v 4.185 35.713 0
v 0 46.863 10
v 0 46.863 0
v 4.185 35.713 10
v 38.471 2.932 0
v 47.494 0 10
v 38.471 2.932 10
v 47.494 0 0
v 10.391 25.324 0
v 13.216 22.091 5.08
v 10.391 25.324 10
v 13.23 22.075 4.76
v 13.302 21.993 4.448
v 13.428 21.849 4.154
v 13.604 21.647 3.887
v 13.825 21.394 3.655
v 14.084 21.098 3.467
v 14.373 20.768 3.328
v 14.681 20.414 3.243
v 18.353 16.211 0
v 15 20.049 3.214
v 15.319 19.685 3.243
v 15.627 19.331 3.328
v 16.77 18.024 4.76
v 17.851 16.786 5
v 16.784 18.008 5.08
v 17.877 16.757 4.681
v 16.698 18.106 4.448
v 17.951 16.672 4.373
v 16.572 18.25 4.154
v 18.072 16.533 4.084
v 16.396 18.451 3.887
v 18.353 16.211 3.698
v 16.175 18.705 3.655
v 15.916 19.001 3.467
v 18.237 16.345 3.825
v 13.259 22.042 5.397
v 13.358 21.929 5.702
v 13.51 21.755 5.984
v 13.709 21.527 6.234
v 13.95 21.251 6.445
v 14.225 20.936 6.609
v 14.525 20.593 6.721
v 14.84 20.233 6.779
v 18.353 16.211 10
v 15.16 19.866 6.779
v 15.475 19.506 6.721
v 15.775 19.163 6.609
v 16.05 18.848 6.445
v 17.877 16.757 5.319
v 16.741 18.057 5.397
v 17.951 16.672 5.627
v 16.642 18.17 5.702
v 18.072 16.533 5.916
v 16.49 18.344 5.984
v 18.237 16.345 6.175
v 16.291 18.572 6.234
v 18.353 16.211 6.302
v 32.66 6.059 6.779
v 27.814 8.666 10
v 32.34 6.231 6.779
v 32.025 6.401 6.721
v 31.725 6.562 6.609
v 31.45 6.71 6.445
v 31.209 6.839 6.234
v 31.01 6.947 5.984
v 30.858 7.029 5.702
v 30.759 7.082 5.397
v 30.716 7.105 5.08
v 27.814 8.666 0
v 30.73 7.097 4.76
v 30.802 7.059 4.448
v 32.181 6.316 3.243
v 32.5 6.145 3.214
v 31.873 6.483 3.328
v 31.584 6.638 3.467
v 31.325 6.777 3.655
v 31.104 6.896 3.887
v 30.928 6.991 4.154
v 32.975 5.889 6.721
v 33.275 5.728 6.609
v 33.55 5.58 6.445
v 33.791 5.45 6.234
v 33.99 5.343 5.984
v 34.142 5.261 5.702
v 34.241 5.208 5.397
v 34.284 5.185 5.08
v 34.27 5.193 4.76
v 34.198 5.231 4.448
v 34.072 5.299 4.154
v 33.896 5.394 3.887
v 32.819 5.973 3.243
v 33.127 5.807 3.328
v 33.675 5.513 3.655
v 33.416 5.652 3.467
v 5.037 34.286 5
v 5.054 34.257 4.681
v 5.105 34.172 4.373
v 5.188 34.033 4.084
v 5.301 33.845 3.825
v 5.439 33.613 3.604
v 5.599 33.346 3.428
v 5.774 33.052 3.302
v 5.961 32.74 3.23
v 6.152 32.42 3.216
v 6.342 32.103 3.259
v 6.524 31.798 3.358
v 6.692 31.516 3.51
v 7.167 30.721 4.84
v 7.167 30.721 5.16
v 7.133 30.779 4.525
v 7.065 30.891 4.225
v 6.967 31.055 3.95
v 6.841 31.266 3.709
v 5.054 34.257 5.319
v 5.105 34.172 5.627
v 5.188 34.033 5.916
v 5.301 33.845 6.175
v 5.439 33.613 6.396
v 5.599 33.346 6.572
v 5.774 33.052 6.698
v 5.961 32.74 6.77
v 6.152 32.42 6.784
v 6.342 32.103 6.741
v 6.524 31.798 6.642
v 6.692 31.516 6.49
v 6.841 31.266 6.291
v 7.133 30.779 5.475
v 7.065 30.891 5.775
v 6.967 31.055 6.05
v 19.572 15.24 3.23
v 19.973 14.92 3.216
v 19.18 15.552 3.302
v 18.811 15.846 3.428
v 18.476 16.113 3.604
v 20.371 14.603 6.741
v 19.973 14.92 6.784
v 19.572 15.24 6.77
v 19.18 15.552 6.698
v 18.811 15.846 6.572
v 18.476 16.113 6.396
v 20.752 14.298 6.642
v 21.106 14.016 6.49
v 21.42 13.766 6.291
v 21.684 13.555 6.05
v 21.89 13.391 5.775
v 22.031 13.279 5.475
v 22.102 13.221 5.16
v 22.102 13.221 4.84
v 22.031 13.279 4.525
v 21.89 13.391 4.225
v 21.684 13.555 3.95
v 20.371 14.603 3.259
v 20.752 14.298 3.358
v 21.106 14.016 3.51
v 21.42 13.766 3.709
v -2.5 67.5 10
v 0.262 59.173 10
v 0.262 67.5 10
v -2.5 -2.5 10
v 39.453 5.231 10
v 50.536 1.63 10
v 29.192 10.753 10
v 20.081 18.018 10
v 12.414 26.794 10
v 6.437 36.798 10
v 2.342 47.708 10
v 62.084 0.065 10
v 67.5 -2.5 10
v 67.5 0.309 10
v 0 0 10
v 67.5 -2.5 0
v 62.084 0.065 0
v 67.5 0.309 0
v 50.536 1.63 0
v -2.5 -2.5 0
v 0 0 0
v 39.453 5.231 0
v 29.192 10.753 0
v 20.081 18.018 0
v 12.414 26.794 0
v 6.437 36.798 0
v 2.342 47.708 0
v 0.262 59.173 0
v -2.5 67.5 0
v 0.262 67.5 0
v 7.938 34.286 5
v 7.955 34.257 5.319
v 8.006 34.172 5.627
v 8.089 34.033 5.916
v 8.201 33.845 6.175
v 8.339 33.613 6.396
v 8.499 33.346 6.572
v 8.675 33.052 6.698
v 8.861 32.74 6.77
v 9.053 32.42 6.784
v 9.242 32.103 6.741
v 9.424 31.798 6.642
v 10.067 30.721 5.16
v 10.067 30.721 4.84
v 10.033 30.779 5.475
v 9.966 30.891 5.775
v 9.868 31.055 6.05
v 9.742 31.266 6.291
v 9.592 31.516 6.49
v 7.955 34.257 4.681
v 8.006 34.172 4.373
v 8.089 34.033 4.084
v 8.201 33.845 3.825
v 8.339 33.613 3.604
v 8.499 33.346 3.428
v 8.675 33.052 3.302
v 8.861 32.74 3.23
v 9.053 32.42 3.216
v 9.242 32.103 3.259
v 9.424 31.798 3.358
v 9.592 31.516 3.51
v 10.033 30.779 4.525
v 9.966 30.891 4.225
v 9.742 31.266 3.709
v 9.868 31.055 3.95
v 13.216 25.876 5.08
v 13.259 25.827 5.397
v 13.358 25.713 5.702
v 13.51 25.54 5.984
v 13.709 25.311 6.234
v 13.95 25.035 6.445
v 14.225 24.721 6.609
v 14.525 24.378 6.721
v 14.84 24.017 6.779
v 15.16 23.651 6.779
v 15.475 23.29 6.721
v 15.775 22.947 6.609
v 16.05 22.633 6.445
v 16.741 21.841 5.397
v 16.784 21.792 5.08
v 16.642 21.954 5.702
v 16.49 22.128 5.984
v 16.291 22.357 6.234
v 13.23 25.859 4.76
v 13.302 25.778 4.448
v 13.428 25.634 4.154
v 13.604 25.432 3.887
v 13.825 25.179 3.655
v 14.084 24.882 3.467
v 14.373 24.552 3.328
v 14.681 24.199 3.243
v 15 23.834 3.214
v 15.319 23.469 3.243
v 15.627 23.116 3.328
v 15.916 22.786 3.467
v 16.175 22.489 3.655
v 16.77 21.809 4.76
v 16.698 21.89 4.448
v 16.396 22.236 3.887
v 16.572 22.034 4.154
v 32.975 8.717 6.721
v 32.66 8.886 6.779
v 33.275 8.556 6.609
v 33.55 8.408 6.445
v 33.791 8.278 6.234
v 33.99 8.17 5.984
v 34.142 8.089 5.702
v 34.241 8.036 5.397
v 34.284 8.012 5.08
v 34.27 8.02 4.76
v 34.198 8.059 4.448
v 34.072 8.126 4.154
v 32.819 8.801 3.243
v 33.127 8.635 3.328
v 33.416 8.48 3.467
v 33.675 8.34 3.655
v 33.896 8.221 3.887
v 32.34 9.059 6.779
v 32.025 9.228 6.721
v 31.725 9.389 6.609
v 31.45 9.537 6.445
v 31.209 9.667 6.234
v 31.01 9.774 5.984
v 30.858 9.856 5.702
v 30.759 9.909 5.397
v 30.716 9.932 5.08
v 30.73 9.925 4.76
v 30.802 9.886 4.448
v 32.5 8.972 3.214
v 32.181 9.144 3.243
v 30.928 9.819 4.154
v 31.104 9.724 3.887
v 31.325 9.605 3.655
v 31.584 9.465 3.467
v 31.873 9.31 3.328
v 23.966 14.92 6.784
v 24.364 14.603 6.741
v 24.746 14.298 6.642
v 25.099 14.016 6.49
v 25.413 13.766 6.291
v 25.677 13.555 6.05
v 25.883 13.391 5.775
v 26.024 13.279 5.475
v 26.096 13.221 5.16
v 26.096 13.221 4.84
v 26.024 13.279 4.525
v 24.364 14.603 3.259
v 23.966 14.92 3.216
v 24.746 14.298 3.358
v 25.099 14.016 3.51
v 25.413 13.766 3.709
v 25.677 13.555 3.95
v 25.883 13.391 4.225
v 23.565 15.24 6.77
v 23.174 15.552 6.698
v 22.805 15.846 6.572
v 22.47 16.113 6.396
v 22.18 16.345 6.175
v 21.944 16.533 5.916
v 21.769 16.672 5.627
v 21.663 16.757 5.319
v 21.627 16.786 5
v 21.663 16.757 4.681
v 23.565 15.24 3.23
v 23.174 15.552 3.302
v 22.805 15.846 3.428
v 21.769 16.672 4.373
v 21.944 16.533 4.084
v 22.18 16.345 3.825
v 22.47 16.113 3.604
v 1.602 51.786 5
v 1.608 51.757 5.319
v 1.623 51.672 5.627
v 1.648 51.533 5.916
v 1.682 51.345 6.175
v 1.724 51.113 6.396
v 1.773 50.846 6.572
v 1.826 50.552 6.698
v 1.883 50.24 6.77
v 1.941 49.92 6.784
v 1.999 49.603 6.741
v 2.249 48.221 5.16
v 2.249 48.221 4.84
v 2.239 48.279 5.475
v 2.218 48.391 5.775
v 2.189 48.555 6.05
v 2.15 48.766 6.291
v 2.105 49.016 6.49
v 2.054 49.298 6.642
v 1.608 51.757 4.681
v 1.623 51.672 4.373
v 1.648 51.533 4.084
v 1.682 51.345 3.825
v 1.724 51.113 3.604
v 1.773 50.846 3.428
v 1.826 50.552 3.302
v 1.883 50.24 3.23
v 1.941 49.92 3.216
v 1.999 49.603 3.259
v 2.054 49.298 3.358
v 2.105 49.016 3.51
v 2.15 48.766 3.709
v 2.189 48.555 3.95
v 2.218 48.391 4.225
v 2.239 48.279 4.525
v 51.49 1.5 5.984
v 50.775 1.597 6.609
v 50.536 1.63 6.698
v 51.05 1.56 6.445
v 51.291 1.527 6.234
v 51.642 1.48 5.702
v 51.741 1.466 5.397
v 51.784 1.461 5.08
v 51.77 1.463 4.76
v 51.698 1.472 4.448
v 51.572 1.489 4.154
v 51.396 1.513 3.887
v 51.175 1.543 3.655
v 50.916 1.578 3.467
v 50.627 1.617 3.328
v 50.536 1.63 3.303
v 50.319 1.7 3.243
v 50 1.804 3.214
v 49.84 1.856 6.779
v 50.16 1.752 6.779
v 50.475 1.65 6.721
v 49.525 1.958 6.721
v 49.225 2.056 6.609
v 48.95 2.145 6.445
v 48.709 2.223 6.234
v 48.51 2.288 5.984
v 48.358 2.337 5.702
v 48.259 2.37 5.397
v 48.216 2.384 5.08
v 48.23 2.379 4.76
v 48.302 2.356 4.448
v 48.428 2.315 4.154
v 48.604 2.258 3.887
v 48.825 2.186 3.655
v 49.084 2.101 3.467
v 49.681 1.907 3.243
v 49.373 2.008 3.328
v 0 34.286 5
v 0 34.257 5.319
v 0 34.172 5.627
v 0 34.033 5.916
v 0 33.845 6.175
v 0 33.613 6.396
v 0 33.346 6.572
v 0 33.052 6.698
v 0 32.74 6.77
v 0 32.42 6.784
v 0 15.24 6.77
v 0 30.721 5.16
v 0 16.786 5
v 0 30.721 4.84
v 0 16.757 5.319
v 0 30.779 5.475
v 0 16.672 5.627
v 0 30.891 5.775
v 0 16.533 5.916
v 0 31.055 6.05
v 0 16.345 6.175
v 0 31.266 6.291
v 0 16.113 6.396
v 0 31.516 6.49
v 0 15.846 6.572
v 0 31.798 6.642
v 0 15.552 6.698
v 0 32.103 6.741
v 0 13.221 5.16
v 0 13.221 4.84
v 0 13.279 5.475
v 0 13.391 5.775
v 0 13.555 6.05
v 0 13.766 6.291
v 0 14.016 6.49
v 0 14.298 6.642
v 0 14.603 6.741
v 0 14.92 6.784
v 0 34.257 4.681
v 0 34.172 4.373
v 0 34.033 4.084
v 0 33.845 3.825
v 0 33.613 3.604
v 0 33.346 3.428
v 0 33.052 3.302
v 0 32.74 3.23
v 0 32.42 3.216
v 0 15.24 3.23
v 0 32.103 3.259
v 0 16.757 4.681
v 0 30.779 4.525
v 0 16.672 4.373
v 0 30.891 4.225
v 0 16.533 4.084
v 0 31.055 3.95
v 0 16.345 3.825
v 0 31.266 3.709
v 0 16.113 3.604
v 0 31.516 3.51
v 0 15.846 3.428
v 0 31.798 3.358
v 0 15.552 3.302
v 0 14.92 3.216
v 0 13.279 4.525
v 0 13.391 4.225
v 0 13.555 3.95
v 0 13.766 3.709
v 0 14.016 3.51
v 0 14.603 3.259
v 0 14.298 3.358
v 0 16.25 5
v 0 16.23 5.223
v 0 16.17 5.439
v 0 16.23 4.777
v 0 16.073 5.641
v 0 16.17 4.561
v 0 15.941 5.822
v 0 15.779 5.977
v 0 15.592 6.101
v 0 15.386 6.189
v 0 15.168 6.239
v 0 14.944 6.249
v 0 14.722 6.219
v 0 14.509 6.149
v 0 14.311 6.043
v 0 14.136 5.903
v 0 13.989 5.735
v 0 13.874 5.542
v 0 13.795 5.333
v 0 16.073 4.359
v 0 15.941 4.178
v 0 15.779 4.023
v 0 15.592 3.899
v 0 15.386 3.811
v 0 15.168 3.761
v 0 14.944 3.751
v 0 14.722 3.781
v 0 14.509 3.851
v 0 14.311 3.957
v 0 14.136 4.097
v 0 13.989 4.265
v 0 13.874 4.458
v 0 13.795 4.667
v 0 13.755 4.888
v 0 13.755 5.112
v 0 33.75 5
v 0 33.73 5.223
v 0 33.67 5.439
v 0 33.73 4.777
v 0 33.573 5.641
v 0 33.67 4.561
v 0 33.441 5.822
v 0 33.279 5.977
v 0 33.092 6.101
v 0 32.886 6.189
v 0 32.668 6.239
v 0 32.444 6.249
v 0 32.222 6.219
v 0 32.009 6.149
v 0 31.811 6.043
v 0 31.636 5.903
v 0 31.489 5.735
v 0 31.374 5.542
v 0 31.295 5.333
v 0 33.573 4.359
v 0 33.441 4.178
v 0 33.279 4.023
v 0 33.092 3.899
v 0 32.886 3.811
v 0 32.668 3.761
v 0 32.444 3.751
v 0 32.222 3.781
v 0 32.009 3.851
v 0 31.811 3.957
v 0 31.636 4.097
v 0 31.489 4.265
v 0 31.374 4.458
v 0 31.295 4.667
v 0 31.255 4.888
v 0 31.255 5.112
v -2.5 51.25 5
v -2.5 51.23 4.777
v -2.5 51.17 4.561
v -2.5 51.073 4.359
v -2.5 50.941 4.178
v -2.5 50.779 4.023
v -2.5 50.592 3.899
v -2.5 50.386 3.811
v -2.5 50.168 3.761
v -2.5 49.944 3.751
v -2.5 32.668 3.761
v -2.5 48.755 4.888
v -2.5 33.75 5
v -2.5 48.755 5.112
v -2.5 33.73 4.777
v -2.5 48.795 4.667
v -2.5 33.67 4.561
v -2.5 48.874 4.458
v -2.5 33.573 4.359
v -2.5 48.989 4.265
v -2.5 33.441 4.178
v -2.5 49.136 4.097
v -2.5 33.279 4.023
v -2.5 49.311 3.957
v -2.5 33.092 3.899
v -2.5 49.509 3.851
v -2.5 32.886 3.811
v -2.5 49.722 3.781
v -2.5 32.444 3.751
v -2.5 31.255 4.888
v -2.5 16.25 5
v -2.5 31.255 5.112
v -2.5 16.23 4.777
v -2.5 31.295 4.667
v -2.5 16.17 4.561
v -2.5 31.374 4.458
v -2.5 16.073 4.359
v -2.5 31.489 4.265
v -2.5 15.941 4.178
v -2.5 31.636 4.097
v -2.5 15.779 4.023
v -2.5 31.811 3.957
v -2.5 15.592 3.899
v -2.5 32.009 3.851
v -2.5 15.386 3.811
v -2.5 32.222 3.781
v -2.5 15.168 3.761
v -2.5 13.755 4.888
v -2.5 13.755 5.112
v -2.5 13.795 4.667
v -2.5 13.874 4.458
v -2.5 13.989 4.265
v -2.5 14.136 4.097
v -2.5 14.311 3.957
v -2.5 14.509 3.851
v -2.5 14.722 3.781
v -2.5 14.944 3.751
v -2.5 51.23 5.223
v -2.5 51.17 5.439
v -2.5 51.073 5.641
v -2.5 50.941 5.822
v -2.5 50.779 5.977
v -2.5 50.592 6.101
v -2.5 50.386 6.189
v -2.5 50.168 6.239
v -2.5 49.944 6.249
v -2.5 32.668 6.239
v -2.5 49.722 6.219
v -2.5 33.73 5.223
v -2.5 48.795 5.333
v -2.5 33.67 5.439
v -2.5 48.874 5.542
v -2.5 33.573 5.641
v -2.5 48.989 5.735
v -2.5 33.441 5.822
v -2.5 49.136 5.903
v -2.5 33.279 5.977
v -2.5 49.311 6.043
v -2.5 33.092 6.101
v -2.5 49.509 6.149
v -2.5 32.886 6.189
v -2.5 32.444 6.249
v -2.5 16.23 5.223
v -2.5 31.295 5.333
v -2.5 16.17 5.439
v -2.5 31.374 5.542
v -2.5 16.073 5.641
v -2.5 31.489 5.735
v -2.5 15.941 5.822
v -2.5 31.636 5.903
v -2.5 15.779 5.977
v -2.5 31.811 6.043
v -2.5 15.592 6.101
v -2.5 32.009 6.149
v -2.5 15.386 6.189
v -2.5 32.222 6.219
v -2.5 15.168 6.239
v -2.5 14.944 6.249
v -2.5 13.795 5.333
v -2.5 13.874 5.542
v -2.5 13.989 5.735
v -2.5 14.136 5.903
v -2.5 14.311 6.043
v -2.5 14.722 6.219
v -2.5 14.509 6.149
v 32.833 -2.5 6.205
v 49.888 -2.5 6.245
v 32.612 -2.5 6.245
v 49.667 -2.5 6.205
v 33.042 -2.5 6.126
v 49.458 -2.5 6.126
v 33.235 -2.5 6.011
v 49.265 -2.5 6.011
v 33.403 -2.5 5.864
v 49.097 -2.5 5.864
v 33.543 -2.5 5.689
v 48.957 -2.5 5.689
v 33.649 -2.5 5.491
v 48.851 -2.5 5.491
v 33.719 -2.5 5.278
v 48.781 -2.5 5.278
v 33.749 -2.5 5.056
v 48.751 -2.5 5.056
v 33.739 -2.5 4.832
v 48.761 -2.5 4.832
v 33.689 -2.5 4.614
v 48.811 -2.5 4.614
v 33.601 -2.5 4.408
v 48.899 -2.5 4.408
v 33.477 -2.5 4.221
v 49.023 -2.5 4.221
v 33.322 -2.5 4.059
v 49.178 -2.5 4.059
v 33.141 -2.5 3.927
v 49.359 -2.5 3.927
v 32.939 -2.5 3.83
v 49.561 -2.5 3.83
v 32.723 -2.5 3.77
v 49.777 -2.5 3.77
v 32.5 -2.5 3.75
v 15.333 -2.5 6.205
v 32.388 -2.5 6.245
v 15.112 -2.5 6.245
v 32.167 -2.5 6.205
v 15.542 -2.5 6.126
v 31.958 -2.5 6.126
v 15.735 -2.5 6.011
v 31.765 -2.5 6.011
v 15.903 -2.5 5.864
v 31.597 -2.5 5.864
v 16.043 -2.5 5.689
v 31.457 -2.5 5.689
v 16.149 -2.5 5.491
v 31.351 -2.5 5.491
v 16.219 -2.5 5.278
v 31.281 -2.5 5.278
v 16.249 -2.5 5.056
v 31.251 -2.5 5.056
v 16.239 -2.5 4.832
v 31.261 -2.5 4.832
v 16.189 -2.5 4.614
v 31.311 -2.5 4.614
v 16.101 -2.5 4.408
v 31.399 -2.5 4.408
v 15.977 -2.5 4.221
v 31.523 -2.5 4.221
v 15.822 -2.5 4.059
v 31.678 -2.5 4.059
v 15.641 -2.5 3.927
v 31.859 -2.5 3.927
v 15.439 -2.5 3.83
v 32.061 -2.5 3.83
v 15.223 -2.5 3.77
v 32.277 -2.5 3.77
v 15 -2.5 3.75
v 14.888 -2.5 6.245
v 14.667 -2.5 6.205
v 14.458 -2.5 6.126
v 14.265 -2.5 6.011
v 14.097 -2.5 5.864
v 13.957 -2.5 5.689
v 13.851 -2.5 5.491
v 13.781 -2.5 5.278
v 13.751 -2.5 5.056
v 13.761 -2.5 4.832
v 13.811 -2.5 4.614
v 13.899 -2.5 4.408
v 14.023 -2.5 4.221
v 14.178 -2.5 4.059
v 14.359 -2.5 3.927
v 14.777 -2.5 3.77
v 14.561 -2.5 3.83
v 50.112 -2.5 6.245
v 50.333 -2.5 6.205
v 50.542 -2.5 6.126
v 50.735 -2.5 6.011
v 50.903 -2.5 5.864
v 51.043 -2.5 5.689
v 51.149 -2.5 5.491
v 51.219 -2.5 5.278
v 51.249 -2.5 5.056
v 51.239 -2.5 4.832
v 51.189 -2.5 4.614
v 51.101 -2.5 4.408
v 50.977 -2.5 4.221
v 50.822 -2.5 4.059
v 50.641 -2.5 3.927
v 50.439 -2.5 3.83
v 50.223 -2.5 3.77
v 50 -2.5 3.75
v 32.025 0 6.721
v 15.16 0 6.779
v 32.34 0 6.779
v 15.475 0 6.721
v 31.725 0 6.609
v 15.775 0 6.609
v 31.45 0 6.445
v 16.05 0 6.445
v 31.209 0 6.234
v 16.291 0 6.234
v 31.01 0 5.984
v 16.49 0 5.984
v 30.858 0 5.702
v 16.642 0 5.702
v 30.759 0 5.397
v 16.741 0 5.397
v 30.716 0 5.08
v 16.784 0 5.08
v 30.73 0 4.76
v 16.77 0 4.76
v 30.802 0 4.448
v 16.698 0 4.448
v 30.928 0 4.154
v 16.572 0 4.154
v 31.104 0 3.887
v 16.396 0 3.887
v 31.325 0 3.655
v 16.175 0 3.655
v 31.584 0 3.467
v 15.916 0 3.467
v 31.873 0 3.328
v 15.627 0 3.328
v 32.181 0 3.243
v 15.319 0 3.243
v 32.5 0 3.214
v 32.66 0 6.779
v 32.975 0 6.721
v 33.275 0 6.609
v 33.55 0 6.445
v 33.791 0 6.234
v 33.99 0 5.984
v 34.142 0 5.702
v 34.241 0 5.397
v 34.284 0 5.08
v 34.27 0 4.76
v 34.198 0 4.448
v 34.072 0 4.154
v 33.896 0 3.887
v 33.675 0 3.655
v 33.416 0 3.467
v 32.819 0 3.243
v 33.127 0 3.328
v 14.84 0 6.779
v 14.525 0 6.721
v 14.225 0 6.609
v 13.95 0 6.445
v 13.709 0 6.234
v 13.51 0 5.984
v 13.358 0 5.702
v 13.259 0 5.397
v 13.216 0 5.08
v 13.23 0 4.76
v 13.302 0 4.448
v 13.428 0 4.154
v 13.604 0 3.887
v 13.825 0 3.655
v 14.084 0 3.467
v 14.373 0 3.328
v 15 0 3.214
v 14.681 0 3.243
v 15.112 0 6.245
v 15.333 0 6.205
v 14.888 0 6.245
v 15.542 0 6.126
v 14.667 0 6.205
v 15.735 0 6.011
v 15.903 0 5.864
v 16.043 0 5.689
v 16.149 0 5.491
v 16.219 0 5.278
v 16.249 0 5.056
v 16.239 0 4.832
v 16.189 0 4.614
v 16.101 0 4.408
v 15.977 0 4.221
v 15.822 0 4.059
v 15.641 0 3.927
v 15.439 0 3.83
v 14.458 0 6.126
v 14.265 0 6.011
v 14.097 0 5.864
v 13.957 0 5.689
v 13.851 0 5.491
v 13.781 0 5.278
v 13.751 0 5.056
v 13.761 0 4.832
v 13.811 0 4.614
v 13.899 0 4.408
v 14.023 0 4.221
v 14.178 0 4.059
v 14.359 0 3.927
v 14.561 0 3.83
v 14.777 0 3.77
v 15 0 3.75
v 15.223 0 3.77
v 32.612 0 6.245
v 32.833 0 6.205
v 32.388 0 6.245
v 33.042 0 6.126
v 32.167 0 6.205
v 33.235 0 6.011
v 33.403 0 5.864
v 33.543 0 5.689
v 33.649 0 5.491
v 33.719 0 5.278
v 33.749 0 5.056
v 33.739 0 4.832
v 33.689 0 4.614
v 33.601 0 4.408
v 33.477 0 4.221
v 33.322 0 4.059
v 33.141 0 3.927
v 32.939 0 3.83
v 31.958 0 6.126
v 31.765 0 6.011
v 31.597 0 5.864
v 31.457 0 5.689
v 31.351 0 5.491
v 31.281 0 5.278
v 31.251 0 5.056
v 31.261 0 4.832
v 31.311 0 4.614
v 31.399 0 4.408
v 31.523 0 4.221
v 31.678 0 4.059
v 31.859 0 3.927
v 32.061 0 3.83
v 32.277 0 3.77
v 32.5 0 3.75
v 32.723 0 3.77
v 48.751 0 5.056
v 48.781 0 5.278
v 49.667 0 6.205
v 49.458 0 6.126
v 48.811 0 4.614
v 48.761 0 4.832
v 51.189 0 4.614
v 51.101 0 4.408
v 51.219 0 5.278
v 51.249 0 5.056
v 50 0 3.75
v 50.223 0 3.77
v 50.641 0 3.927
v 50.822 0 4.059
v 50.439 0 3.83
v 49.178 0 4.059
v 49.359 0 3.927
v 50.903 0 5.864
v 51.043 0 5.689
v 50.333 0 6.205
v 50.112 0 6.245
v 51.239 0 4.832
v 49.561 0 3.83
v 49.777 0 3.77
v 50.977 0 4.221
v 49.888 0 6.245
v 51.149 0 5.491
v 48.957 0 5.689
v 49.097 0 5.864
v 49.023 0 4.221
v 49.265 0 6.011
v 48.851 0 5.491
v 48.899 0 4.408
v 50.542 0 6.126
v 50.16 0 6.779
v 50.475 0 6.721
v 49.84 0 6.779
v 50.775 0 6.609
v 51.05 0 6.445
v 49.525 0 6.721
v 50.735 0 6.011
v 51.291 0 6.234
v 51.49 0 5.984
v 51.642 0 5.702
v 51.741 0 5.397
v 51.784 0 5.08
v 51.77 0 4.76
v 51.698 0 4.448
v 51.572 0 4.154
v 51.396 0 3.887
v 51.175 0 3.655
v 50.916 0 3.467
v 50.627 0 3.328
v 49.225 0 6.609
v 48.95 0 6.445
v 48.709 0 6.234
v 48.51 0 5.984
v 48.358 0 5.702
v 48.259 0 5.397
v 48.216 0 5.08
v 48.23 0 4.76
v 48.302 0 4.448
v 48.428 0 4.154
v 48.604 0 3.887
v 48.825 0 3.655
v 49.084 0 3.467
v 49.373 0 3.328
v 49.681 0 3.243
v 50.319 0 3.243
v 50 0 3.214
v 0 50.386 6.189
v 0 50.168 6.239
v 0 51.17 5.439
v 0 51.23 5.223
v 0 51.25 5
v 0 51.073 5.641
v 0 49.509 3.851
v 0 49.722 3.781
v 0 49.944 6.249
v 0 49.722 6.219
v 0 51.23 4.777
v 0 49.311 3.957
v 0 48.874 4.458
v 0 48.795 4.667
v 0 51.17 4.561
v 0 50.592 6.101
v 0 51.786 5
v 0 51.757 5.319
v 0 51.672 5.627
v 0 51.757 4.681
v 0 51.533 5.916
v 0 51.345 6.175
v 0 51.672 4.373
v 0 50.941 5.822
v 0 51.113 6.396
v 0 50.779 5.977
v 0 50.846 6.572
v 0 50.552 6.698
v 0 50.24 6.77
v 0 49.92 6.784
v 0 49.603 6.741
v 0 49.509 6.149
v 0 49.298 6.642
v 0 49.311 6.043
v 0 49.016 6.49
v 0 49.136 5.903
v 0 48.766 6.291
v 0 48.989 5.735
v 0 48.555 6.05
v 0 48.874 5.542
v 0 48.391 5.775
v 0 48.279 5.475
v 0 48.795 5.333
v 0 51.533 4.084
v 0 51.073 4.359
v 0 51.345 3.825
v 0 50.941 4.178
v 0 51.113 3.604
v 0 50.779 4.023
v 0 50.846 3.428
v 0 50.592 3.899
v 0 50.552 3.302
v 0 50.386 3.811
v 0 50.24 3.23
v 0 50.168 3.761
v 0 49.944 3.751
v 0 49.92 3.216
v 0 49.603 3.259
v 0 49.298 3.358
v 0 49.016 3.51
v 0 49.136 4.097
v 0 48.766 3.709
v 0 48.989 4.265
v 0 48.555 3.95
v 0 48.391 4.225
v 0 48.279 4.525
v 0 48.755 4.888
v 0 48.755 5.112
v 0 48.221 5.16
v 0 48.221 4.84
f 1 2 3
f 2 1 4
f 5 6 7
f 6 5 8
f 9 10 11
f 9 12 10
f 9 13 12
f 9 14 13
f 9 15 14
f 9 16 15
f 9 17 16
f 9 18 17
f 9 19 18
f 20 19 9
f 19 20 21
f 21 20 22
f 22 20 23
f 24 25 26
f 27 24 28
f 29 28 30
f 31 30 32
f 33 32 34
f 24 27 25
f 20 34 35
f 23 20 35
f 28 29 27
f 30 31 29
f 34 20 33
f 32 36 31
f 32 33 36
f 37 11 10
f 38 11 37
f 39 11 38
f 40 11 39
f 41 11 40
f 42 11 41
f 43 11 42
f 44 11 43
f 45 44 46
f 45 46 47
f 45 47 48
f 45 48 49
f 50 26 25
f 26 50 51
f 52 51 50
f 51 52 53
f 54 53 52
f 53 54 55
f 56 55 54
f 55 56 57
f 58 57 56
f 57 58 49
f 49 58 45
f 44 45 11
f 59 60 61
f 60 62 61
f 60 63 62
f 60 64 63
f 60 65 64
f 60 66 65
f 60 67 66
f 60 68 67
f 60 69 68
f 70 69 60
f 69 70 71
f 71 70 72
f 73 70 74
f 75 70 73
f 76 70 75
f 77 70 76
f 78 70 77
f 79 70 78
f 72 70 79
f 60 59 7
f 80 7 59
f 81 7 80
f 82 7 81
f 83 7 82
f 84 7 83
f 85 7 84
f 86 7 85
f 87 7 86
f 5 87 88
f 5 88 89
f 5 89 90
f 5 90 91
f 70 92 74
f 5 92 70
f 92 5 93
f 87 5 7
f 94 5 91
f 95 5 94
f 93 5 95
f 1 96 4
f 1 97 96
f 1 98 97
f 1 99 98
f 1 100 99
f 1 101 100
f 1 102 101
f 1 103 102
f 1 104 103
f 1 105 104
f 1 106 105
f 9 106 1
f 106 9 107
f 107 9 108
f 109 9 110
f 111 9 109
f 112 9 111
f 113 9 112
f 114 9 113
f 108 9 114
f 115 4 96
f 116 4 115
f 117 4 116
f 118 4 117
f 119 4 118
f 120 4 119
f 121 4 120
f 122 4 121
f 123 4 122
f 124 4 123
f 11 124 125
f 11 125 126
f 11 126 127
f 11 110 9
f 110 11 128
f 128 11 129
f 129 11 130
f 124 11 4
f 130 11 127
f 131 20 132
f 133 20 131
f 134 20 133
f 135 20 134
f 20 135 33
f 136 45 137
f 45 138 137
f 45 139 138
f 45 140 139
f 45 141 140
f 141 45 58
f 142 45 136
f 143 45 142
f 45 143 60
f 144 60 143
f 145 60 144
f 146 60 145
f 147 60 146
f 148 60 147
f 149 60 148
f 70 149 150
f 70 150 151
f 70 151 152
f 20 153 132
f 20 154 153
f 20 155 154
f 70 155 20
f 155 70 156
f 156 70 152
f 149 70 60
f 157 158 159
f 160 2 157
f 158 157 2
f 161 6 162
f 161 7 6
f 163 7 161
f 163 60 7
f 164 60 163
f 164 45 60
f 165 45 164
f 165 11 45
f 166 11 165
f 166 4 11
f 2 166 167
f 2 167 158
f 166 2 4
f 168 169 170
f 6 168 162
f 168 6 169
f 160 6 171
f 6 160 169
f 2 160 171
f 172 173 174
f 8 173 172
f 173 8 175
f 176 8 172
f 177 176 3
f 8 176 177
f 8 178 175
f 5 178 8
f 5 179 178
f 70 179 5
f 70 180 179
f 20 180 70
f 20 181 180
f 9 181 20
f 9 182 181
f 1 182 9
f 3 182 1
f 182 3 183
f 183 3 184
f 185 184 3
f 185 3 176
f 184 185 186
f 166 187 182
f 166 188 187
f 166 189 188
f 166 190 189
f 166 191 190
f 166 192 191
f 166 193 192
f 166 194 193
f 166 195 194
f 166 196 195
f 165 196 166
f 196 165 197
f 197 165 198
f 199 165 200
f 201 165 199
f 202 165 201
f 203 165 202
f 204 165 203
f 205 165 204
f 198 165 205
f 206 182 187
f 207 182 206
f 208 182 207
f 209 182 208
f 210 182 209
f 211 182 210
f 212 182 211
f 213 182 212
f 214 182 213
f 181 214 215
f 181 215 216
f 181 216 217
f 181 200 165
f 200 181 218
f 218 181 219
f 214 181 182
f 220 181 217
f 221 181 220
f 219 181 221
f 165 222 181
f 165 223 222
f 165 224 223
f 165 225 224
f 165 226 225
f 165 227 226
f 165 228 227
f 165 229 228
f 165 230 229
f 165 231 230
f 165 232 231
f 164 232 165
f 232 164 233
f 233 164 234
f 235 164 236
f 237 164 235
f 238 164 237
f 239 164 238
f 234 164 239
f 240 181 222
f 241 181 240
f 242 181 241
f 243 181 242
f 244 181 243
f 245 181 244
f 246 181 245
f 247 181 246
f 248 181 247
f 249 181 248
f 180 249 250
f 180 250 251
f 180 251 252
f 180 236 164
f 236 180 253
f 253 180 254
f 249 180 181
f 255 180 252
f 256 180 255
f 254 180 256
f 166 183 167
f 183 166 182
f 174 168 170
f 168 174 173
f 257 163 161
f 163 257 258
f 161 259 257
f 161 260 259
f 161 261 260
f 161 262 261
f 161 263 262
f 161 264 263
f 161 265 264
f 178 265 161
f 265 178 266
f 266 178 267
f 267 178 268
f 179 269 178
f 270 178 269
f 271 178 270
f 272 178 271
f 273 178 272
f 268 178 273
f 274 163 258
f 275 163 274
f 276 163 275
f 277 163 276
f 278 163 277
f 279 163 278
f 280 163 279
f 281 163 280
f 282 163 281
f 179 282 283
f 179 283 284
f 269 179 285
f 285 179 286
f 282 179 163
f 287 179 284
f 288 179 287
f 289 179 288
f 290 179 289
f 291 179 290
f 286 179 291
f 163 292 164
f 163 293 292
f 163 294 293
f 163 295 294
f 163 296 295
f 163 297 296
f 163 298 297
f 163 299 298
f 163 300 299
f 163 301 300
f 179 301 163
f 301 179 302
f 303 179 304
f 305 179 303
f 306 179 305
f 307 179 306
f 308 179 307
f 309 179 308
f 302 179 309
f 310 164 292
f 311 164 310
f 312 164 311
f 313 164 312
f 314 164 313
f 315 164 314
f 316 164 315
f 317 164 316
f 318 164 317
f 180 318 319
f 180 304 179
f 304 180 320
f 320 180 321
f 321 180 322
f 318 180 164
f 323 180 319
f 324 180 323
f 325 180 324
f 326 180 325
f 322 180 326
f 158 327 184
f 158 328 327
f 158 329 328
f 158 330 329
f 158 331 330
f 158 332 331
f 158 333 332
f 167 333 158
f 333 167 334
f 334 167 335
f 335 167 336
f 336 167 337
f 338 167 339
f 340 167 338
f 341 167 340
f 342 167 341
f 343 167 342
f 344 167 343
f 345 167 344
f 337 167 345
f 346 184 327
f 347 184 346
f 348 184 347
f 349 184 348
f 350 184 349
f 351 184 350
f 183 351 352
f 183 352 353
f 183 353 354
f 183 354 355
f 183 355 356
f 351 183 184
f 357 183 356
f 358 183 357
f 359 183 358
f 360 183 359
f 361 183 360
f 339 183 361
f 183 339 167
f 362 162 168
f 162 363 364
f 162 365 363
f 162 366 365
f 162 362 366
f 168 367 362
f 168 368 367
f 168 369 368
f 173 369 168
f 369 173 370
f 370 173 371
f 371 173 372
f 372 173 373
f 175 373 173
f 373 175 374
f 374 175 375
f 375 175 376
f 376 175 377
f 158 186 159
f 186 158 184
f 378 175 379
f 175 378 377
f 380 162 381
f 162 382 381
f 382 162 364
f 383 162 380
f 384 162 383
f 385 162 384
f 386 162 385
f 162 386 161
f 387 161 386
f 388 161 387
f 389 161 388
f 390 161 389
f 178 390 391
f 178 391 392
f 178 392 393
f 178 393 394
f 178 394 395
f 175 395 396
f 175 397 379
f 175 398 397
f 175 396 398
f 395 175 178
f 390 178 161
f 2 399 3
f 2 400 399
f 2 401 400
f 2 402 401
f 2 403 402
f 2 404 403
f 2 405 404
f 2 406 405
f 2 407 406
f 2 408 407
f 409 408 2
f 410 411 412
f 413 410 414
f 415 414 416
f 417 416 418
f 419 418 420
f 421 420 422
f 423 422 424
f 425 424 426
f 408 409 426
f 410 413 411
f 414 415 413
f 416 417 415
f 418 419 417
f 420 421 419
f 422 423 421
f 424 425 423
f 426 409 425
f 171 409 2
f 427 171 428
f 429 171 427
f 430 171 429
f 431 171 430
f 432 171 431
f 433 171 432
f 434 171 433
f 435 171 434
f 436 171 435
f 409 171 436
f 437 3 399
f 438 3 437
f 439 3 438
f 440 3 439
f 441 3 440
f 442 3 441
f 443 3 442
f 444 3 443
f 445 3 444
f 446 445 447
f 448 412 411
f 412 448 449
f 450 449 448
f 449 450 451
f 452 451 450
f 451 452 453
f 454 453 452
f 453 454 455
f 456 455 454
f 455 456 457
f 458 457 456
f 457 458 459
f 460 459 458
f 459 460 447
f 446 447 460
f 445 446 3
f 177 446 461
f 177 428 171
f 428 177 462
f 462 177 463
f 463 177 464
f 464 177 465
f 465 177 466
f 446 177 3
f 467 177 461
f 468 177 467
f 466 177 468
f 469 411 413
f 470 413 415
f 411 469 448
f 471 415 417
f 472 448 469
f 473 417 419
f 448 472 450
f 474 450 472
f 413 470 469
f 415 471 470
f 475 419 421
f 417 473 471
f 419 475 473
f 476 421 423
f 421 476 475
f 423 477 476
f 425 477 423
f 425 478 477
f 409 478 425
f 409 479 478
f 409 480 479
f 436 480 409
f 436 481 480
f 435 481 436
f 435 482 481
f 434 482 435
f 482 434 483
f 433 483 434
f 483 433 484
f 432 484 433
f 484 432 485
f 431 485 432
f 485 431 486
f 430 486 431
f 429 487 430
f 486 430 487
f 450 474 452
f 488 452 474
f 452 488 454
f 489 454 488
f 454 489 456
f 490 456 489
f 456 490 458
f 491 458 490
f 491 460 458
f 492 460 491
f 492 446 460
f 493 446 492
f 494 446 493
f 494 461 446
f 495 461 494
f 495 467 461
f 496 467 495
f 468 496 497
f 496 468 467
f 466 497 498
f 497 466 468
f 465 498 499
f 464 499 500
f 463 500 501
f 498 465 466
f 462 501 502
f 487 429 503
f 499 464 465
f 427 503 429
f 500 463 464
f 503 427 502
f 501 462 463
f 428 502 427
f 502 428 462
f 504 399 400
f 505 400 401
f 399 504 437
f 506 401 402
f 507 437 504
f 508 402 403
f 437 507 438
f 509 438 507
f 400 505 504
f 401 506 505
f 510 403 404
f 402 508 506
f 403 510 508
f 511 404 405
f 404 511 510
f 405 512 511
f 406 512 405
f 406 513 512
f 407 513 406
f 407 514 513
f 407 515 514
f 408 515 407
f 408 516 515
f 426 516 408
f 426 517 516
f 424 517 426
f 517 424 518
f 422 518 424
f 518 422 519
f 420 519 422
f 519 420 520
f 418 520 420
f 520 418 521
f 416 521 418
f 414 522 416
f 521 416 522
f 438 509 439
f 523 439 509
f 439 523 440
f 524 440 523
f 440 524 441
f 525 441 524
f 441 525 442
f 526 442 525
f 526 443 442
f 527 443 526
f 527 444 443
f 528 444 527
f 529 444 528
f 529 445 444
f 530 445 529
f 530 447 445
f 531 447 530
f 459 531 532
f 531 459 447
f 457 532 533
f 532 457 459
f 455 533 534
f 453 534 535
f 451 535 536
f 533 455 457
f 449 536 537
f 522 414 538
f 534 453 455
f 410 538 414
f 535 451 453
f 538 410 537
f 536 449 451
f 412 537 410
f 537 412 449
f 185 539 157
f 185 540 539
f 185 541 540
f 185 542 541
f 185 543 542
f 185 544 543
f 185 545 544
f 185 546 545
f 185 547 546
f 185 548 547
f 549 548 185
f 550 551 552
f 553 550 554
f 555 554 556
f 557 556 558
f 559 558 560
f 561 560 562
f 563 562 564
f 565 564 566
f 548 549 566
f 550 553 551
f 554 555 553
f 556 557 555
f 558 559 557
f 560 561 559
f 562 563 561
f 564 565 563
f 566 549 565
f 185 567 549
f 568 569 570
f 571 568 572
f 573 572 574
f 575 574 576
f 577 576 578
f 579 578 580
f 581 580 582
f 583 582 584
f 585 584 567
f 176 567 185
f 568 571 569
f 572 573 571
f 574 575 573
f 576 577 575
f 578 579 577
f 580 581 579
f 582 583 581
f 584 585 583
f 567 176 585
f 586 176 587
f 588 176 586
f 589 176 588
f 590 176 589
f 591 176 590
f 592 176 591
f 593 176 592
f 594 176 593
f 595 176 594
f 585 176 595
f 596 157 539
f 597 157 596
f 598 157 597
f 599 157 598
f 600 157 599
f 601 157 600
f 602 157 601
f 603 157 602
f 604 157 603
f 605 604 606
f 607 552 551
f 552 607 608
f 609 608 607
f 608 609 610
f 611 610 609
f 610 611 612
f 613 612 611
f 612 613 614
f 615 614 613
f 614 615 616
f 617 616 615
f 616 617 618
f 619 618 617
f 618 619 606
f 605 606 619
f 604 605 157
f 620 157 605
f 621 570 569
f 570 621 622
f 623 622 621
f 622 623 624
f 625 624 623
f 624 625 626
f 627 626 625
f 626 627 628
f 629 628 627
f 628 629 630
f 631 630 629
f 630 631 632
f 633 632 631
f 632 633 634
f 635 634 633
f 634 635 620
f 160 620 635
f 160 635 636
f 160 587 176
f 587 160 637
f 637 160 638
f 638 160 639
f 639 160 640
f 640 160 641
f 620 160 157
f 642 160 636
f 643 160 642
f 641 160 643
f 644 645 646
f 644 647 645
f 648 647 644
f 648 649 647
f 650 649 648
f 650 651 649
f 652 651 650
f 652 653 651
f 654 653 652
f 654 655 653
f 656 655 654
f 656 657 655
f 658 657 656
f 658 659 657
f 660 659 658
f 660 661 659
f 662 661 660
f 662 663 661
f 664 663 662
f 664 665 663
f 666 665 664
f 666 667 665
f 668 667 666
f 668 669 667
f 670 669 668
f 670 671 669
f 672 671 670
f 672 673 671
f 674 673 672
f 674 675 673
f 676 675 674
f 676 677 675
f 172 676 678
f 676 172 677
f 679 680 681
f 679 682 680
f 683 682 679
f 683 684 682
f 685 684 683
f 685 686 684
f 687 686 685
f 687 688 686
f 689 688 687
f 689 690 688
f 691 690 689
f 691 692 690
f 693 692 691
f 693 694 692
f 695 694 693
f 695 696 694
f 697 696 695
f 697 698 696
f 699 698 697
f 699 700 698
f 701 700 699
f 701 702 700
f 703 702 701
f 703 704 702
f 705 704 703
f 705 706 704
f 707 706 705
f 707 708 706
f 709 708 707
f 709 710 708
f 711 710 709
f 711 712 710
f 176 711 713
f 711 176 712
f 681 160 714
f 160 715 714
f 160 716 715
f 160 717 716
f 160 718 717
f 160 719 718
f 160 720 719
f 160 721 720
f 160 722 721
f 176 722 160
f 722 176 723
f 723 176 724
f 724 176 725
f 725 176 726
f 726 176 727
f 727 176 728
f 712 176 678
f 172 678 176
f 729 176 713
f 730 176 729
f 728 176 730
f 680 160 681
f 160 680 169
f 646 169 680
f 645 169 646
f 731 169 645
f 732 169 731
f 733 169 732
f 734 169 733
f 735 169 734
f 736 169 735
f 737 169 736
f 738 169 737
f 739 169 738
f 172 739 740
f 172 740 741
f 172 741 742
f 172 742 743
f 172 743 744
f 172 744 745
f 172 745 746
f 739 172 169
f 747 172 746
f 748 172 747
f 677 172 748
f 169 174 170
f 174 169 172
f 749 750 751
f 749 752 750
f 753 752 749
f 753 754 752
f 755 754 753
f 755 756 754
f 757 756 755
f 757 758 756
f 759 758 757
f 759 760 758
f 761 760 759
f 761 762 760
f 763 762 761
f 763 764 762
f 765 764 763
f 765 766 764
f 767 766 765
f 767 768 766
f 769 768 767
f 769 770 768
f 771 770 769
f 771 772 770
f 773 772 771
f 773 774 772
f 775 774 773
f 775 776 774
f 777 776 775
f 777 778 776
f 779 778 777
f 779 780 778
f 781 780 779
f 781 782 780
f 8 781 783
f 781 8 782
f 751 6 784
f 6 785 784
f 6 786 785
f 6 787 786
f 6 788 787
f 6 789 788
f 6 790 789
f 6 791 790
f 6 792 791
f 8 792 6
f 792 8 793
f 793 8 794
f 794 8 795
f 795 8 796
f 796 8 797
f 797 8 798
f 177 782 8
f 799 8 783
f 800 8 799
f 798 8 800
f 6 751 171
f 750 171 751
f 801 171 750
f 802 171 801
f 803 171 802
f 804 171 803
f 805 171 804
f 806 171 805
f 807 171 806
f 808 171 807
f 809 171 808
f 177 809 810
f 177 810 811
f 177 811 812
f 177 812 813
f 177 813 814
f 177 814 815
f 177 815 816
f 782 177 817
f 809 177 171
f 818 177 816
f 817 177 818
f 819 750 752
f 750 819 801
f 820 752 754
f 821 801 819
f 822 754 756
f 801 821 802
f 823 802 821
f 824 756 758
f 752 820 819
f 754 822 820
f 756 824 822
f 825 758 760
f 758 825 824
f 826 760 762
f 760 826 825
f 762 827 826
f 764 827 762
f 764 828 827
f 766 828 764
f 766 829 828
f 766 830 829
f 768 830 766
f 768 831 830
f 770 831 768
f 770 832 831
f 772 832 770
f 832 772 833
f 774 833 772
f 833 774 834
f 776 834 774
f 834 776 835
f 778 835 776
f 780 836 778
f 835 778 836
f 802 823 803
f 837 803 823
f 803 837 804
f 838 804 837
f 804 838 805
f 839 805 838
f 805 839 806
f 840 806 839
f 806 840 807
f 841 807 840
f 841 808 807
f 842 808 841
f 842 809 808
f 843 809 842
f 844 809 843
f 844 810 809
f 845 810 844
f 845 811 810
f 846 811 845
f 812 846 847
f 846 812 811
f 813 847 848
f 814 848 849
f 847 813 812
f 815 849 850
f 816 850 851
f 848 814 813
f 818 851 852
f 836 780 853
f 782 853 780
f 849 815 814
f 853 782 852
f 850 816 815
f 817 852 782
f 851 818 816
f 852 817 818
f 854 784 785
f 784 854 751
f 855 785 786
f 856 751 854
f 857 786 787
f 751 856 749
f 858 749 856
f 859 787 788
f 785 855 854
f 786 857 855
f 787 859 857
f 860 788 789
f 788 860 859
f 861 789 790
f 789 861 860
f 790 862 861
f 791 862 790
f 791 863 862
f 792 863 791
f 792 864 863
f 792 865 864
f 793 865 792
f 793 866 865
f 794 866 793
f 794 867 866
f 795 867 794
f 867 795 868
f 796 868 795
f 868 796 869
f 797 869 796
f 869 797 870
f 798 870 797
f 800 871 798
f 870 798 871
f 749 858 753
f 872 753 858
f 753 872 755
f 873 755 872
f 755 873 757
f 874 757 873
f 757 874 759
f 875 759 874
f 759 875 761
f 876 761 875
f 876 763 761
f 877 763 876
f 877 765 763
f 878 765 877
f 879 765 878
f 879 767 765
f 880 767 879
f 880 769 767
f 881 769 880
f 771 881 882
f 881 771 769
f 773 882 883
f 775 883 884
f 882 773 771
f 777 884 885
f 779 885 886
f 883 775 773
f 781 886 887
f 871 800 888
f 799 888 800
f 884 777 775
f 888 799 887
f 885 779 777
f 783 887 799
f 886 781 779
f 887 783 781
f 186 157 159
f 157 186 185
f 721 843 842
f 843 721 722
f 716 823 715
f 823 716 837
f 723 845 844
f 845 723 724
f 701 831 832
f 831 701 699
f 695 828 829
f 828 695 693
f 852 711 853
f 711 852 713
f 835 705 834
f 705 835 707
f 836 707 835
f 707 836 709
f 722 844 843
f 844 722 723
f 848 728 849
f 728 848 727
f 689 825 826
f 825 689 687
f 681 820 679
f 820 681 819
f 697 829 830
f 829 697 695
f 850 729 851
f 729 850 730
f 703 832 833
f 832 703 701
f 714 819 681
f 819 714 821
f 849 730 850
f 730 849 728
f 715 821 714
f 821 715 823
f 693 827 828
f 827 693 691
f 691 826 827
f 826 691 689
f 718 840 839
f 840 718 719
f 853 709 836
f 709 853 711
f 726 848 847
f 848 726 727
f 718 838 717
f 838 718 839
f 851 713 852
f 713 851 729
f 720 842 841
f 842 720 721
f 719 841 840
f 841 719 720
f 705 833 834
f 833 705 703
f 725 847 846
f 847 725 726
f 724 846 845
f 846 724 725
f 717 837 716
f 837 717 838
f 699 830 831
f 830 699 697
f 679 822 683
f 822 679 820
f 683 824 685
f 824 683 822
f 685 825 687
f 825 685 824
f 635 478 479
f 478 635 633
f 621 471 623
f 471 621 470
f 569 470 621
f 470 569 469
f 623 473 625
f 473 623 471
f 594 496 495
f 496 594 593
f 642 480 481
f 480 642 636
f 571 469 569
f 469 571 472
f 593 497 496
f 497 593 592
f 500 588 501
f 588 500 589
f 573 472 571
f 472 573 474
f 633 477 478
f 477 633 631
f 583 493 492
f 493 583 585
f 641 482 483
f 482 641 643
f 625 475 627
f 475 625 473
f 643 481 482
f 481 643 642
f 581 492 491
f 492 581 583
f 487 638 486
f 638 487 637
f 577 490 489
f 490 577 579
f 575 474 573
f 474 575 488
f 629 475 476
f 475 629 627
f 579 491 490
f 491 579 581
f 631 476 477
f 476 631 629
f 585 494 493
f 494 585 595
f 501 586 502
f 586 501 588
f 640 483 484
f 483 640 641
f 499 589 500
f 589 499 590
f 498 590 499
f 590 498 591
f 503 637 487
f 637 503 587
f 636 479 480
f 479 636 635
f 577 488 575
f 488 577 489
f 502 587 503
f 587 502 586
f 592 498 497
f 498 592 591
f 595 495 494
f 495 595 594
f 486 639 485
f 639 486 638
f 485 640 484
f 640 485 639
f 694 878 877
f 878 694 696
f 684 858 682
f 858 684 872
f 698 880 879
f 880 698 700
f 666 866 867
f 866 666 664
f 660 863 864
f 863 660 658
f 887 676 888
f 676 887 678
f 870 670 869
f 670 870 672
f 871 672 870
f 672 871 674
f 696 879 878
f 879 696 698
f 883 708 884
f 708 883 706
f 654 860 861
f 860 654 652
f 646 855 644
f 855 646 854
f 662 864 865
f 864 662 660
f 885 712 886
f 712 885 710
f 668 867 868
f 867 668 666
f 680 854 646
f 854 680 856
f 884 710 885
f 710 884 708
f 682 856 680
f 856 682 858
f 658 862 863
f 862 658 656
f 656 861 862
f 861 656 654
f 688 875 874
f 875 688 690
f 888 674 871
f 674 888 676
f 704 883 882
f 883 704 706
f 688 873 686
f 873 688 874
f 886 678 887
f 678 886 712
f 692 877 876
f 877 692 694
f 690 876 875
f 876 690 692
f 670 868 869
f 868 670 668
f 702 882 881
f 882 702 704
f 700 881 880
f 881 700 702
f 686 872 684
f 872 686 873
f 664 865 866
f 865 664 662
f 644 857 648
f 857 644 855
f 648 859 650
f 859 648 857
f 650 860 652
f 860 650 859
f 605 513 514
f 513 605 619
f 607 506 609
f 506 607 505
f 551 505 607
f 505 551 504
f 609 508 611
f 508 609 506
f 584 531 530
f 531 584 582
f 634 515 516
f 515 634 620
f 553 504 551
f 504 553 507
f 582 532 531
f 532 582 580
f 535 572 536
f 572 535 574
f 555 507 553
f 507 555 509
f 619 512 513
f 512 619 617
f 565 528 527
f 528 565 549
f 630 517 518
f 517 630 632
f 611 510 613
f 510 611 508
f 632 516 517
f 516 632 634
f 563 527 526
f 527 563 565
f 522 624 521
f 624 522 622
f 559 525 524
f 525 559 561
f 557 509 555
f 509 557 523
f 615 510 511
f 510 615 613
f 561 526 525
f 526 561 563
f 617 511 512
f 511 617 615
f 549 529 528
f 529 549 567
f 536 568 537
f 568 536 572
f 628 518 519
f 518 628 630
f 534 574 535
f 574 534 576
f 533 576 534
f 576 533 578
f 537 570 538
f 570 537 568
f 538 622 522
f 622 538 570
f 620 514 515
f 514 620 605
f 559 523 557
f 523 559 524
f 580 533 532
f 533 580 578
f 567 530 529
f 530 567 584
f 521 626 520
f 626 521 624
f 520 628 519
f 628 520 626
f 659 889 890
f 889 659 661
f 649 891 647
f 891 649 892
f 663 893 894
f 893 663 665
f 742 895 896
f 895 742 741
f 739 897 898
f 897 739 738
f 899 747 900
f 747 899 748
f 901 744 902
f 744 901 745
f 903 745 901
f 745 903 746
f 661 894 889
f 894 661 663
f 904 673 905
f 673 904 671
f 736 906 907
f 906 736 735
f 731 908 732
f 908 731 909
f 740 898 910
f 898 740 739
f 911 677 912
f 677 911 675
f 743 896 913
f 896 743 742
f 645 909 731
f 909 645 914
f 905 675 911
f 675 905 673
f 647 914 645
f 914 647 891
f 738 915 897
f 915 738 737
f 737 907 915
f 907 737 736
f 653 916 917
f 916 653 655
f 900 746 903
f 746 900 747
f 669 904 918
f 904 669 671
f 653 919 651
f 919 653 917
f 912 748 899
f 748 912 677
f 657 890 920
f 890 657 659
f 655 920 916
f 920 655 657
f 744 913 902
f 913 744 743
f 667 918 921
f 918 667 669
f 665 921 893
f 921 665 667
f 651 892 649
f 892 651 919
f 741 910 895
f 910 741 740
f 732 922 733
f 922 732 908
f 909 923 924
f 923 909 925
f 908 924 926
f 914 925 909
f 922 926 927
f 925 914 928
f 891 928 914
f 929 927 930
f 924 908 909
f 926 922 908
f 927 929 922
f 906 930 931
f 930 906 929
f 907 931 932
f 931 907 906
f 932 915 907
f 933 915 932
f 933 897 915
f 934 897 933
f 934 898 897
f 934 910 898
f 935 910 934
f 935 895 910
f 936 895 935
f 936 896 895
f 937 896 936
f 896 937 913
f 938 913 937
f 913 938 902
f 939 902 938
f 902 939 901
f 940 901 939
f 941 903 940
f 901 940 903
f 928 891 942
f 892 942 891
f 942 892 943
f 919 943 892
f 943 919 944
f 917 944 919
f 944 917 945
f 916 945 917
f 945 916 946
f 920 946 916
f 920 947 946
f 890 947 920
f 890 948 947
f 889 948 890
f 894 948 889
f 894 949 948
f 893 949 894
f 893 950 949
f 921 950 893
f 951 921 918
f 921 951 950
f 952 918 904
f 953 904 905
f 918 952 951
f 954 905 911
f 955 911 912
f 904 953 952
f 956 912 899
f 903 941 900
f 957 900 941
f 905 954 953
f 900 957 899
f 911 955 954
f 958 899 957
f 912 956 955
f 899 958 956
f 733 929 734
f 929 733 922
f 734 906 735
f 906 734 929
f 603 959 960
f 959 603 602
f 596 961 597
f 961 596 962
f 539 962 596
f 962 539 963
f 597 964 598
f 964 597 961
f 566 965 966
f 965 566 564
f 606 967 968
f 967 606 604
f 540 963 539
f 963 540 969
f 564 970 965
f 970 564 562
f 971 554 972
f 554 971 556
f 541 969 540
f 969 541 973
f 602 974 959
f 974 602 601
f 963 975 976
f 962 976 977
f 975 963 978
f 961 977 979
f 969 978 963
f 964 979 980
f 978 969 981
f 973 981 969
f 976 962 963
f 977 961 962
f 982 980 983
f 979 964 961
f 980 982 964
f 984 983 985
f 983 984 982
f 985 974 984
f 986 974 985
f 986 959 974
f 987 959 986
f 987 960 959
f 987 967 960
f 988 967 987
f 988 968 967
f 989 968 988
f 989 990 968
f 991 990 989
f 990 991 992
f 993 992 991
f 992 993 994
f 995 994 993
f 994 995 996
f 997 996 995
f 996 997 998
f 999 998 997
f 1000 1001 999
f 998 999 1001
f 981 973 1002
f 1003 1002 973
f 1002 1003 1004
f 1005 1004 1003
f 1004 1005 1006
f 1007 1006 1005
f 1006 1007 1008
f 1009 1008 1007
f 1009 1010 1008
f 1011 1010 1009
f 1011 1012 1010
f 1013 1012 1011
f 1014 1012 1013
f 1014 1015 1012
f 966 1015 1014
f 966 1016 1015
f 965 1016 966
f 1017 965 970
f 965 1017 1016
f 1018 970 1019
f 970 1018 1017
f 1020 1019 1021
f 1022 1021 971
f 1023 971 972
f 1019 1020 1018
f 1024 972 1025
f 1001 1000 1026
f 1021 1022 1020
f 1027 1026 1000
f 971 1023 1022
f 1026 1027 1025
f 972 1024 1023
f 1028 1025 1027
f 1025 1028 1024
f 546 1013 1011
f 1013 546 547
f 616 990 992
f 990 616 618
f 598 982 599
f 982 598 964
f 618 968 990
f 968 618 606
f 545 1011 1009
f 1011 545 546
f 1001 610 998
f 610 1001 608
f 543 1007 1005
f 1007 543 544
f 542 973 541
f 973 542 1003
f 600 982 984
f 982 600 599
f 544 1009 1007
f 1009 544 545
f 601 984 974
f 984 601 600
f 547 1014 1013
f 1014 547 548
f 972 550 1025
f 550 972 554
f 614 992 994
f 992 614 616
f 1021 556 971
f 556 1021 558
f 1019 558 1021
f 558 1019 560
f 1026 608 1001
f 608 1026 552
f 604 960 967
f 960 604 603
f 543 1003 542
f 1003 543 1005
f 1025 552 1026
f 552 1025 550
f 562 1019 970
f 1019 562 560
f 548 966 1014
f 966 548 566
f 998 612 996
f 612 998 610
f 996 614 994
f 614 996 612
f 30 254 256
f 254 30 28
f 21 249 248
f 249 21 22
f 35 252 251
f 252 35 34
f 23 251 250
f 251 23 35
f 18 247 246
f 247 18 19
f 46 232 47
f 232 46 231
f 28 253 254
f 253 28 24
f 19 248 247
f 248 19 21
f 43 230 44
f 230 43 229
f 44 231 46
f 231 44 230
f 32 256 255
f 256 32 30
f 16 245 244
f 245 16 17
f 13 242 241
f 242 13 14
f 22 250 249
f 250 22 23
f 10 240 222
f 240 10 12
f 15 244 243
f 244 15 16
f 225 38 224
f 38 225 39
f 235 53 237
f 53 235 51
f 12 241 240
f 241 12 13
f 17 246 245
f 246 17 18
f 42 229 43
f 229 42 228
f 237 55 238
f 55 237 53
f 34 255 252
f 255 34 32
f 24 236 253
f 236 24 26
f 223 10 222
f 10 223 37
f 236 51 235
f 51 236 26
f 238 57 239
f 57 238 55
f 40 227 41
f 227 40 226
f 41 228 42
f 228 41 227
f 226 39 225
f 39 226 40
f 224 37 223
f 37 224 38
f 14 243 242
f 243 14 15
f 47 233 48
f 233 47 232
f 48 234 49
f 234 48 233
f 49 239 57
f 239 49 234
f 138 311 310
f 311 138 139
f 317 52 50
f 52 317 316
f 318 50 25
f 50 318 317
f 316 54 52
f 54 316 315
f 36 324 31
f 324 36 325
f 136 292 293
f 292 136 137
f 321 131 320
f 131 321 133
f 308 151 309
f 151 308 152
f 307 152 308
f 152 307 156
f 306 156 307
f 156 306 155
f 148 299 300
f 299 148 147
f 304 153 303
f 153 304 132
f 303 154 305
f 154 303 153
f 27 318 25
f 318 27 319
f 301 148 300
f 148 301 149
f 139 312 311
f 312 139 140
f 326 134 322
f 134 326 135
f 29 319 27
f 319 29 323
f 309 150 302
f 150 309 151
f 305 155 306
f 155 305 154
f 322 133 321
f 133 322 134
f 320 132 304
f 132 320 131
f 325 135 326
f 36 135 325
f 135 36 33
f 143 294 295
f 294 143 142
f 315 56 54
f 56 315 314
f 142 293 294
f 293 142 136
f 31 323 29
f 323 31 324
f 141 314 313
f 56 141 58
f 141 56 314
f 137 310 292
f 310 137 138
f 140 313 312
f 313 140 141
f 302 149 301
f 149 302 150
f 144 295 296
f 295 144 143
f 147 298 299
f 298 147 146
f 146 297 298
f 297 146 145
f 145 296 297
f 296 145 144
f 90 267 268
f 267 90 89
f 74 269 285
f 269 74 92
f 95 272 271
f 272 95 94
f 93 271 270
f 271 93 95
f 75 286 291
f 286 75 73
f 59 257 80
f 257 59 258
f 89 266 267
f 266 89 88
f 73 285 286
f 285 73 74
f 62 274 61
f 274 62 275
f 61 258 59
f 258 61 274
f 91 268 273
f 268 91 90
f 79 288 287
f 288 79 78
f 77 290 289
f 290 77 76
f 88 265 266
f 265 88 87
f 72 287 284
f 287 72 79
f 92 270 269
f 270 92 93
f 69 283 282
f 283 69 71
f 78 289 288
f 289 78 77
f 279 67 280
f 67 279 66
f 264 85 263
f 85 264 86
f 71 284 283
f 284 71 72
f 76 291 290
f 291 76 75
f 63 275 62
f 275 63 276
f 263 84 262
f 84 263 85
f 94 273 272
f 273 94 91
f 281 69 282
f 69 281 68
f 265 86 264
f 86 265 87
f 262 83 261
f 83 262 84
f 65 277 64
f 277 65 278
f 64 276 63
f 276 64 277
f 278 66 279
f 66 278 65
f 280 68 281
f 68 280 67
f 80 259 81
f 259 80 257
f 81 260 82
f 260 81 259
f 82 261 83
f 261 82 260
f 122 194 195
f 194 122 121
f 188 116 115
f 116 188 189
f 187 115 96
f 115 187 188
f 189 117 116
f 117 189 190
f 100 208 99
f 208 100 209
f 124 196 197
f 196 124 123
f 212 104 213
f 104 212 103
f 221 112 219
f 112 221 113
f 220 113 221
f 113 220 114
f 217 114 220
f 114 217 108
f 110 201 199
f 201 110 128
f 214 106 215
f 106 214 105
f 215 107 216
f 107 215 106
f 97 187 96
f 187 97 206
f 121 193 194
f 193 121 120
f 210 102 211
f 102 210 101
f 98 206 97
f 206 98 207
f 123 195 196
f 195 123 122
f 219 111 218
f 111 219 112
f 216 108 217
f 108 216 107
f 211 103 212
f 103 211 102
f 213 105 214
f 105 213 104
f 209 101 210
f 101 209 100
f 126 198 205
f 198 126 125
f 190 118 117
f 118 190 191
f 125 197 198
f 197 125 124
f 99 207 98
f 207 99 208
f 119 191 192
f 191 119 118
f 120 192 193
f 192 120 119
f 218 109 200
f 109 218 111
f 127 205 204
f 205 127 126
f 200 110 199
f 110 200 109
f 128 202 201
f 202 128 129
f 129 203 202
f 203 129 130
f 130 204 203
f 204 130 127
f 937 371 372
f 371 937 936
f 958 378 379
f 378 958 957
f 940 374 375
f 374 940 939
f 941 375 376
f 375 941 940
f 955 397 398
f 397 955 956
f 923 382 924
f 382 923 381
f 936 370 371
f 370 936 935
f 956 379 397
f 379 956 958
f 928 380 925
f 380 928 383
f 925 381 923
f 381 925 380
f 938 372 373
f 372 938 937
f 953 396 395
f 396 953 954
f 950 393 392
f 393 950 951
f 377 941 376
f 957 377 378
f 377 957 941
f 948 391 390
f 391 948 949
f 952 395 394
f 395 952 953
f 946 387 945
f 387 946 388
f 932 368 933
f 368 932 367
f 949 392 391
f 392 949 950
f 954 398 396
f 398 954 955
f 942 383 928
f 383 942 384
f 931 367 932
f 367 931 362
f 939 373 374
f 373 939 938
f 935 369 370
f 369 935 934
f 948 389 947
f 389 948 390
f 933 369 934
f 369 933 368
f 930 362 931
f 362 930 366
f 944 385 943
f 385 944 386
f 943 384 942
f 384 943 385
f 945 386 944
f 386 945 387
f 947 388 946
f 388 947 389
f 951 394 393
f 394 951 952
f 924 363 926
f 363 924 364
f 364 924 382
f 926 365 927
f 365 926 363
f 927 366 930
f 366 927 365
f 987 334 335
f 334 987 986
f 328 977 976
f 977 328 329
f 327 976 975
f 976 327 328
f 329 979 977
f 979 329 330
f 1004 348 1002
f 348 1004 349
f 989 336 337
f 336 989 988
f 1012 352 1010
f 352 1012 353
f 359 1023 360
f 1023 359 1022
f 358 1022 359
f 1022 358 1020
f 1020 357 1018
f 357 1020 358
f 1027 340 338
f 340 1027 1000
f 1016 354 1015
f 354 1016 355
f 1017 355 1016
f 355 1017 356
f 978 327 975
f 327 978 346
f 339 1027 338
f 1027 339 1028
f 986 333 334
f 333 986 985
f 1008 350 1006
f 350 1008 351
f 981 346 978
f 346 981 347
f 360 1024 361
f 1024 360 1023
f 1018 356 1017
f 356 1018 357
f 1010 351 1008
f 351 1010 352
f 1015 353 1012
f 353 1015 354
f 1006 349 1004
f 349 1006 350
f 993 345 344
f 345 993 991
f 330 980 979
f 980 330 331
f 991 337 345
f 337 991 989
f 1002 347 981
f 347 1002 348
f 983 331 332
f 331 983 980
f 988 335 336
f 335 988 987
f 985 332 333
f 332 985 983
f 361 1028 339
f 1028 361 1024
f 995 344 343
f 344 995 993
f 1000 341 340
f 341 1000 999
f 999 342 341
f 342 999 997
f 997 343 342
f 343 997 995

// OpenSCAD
//length of bracket
length = 70;		
//width of bracket	
width = 10;		
//thickness 
thickness = 2.5;	
//number of holes
holecount=3;	
//hole diameter
holediameter=2.5;
//Make outer holes (1=true 0=false)
outers=1;

module Bracket(l,w,t) {
$fn=35;
intersection(){
	difference() {
		union() {
			translate([-t,-t,0]) cube( size=[t,t+1,w]);
			translate([0,-t,0]) cube( size=[l,t,w]);
			rotate ([0,0,90]) cube( size=[l,t,w]);
			translate ([l-t,l-t,0]) hoop(l,w,t);
			}
		smallholes();
		if (outers) largeholes();
		}
	translate([-t,-t,-1]) cube ( size=[l+t,l+t,w+2]); //cylinder(h=w+2,r1=l,r2=l);
	
	}
}

module hoop(l,w,t) {
n=20;
difference(){
			cylinder(h=w,r1=l,r2=l) ;
			cylinder(h=w,r1=l-t,r2=l-t) ;
		}
}

module smallholes() {
	n=length/(holecount+1);
   for (i=[0:holecount-1]) {
		//x axis
		translate ([n-thickness+i*n,0,width/2]) rotate(a=[90,90,0]) cylinder(h=thickness+1,r1=holediameter/2,r2=holediameter/2);
		// y axis		
		translate ([-thickness,n-thickness+i*n,width/2]) rotate([90,0,90]) cylinder(h=thickness,r1=holediameter/2,r2=holediameter/2);		

	}

}
module largeholes() {
	lhm=1.4; //large hole factor
	n=length/(holecount+1);
   for (i=[0:holecount-1]) {
		//x axis
		translate ([n-thickness+i*n,length,width/2]) rotate(a=[90,90,0]) cylinder(h=length,r1=holediameter/lhm,r2=holediameter/lhm);
		// y axis		
		translate ([0,n-thickness+i*n,width/2]) rotate([90,0,90]) cylinder(h=length,r1=holediameter/lhm,r2=holediameter/lhm);		
	}

}


Bracket(length-thickness,width,thickness);
